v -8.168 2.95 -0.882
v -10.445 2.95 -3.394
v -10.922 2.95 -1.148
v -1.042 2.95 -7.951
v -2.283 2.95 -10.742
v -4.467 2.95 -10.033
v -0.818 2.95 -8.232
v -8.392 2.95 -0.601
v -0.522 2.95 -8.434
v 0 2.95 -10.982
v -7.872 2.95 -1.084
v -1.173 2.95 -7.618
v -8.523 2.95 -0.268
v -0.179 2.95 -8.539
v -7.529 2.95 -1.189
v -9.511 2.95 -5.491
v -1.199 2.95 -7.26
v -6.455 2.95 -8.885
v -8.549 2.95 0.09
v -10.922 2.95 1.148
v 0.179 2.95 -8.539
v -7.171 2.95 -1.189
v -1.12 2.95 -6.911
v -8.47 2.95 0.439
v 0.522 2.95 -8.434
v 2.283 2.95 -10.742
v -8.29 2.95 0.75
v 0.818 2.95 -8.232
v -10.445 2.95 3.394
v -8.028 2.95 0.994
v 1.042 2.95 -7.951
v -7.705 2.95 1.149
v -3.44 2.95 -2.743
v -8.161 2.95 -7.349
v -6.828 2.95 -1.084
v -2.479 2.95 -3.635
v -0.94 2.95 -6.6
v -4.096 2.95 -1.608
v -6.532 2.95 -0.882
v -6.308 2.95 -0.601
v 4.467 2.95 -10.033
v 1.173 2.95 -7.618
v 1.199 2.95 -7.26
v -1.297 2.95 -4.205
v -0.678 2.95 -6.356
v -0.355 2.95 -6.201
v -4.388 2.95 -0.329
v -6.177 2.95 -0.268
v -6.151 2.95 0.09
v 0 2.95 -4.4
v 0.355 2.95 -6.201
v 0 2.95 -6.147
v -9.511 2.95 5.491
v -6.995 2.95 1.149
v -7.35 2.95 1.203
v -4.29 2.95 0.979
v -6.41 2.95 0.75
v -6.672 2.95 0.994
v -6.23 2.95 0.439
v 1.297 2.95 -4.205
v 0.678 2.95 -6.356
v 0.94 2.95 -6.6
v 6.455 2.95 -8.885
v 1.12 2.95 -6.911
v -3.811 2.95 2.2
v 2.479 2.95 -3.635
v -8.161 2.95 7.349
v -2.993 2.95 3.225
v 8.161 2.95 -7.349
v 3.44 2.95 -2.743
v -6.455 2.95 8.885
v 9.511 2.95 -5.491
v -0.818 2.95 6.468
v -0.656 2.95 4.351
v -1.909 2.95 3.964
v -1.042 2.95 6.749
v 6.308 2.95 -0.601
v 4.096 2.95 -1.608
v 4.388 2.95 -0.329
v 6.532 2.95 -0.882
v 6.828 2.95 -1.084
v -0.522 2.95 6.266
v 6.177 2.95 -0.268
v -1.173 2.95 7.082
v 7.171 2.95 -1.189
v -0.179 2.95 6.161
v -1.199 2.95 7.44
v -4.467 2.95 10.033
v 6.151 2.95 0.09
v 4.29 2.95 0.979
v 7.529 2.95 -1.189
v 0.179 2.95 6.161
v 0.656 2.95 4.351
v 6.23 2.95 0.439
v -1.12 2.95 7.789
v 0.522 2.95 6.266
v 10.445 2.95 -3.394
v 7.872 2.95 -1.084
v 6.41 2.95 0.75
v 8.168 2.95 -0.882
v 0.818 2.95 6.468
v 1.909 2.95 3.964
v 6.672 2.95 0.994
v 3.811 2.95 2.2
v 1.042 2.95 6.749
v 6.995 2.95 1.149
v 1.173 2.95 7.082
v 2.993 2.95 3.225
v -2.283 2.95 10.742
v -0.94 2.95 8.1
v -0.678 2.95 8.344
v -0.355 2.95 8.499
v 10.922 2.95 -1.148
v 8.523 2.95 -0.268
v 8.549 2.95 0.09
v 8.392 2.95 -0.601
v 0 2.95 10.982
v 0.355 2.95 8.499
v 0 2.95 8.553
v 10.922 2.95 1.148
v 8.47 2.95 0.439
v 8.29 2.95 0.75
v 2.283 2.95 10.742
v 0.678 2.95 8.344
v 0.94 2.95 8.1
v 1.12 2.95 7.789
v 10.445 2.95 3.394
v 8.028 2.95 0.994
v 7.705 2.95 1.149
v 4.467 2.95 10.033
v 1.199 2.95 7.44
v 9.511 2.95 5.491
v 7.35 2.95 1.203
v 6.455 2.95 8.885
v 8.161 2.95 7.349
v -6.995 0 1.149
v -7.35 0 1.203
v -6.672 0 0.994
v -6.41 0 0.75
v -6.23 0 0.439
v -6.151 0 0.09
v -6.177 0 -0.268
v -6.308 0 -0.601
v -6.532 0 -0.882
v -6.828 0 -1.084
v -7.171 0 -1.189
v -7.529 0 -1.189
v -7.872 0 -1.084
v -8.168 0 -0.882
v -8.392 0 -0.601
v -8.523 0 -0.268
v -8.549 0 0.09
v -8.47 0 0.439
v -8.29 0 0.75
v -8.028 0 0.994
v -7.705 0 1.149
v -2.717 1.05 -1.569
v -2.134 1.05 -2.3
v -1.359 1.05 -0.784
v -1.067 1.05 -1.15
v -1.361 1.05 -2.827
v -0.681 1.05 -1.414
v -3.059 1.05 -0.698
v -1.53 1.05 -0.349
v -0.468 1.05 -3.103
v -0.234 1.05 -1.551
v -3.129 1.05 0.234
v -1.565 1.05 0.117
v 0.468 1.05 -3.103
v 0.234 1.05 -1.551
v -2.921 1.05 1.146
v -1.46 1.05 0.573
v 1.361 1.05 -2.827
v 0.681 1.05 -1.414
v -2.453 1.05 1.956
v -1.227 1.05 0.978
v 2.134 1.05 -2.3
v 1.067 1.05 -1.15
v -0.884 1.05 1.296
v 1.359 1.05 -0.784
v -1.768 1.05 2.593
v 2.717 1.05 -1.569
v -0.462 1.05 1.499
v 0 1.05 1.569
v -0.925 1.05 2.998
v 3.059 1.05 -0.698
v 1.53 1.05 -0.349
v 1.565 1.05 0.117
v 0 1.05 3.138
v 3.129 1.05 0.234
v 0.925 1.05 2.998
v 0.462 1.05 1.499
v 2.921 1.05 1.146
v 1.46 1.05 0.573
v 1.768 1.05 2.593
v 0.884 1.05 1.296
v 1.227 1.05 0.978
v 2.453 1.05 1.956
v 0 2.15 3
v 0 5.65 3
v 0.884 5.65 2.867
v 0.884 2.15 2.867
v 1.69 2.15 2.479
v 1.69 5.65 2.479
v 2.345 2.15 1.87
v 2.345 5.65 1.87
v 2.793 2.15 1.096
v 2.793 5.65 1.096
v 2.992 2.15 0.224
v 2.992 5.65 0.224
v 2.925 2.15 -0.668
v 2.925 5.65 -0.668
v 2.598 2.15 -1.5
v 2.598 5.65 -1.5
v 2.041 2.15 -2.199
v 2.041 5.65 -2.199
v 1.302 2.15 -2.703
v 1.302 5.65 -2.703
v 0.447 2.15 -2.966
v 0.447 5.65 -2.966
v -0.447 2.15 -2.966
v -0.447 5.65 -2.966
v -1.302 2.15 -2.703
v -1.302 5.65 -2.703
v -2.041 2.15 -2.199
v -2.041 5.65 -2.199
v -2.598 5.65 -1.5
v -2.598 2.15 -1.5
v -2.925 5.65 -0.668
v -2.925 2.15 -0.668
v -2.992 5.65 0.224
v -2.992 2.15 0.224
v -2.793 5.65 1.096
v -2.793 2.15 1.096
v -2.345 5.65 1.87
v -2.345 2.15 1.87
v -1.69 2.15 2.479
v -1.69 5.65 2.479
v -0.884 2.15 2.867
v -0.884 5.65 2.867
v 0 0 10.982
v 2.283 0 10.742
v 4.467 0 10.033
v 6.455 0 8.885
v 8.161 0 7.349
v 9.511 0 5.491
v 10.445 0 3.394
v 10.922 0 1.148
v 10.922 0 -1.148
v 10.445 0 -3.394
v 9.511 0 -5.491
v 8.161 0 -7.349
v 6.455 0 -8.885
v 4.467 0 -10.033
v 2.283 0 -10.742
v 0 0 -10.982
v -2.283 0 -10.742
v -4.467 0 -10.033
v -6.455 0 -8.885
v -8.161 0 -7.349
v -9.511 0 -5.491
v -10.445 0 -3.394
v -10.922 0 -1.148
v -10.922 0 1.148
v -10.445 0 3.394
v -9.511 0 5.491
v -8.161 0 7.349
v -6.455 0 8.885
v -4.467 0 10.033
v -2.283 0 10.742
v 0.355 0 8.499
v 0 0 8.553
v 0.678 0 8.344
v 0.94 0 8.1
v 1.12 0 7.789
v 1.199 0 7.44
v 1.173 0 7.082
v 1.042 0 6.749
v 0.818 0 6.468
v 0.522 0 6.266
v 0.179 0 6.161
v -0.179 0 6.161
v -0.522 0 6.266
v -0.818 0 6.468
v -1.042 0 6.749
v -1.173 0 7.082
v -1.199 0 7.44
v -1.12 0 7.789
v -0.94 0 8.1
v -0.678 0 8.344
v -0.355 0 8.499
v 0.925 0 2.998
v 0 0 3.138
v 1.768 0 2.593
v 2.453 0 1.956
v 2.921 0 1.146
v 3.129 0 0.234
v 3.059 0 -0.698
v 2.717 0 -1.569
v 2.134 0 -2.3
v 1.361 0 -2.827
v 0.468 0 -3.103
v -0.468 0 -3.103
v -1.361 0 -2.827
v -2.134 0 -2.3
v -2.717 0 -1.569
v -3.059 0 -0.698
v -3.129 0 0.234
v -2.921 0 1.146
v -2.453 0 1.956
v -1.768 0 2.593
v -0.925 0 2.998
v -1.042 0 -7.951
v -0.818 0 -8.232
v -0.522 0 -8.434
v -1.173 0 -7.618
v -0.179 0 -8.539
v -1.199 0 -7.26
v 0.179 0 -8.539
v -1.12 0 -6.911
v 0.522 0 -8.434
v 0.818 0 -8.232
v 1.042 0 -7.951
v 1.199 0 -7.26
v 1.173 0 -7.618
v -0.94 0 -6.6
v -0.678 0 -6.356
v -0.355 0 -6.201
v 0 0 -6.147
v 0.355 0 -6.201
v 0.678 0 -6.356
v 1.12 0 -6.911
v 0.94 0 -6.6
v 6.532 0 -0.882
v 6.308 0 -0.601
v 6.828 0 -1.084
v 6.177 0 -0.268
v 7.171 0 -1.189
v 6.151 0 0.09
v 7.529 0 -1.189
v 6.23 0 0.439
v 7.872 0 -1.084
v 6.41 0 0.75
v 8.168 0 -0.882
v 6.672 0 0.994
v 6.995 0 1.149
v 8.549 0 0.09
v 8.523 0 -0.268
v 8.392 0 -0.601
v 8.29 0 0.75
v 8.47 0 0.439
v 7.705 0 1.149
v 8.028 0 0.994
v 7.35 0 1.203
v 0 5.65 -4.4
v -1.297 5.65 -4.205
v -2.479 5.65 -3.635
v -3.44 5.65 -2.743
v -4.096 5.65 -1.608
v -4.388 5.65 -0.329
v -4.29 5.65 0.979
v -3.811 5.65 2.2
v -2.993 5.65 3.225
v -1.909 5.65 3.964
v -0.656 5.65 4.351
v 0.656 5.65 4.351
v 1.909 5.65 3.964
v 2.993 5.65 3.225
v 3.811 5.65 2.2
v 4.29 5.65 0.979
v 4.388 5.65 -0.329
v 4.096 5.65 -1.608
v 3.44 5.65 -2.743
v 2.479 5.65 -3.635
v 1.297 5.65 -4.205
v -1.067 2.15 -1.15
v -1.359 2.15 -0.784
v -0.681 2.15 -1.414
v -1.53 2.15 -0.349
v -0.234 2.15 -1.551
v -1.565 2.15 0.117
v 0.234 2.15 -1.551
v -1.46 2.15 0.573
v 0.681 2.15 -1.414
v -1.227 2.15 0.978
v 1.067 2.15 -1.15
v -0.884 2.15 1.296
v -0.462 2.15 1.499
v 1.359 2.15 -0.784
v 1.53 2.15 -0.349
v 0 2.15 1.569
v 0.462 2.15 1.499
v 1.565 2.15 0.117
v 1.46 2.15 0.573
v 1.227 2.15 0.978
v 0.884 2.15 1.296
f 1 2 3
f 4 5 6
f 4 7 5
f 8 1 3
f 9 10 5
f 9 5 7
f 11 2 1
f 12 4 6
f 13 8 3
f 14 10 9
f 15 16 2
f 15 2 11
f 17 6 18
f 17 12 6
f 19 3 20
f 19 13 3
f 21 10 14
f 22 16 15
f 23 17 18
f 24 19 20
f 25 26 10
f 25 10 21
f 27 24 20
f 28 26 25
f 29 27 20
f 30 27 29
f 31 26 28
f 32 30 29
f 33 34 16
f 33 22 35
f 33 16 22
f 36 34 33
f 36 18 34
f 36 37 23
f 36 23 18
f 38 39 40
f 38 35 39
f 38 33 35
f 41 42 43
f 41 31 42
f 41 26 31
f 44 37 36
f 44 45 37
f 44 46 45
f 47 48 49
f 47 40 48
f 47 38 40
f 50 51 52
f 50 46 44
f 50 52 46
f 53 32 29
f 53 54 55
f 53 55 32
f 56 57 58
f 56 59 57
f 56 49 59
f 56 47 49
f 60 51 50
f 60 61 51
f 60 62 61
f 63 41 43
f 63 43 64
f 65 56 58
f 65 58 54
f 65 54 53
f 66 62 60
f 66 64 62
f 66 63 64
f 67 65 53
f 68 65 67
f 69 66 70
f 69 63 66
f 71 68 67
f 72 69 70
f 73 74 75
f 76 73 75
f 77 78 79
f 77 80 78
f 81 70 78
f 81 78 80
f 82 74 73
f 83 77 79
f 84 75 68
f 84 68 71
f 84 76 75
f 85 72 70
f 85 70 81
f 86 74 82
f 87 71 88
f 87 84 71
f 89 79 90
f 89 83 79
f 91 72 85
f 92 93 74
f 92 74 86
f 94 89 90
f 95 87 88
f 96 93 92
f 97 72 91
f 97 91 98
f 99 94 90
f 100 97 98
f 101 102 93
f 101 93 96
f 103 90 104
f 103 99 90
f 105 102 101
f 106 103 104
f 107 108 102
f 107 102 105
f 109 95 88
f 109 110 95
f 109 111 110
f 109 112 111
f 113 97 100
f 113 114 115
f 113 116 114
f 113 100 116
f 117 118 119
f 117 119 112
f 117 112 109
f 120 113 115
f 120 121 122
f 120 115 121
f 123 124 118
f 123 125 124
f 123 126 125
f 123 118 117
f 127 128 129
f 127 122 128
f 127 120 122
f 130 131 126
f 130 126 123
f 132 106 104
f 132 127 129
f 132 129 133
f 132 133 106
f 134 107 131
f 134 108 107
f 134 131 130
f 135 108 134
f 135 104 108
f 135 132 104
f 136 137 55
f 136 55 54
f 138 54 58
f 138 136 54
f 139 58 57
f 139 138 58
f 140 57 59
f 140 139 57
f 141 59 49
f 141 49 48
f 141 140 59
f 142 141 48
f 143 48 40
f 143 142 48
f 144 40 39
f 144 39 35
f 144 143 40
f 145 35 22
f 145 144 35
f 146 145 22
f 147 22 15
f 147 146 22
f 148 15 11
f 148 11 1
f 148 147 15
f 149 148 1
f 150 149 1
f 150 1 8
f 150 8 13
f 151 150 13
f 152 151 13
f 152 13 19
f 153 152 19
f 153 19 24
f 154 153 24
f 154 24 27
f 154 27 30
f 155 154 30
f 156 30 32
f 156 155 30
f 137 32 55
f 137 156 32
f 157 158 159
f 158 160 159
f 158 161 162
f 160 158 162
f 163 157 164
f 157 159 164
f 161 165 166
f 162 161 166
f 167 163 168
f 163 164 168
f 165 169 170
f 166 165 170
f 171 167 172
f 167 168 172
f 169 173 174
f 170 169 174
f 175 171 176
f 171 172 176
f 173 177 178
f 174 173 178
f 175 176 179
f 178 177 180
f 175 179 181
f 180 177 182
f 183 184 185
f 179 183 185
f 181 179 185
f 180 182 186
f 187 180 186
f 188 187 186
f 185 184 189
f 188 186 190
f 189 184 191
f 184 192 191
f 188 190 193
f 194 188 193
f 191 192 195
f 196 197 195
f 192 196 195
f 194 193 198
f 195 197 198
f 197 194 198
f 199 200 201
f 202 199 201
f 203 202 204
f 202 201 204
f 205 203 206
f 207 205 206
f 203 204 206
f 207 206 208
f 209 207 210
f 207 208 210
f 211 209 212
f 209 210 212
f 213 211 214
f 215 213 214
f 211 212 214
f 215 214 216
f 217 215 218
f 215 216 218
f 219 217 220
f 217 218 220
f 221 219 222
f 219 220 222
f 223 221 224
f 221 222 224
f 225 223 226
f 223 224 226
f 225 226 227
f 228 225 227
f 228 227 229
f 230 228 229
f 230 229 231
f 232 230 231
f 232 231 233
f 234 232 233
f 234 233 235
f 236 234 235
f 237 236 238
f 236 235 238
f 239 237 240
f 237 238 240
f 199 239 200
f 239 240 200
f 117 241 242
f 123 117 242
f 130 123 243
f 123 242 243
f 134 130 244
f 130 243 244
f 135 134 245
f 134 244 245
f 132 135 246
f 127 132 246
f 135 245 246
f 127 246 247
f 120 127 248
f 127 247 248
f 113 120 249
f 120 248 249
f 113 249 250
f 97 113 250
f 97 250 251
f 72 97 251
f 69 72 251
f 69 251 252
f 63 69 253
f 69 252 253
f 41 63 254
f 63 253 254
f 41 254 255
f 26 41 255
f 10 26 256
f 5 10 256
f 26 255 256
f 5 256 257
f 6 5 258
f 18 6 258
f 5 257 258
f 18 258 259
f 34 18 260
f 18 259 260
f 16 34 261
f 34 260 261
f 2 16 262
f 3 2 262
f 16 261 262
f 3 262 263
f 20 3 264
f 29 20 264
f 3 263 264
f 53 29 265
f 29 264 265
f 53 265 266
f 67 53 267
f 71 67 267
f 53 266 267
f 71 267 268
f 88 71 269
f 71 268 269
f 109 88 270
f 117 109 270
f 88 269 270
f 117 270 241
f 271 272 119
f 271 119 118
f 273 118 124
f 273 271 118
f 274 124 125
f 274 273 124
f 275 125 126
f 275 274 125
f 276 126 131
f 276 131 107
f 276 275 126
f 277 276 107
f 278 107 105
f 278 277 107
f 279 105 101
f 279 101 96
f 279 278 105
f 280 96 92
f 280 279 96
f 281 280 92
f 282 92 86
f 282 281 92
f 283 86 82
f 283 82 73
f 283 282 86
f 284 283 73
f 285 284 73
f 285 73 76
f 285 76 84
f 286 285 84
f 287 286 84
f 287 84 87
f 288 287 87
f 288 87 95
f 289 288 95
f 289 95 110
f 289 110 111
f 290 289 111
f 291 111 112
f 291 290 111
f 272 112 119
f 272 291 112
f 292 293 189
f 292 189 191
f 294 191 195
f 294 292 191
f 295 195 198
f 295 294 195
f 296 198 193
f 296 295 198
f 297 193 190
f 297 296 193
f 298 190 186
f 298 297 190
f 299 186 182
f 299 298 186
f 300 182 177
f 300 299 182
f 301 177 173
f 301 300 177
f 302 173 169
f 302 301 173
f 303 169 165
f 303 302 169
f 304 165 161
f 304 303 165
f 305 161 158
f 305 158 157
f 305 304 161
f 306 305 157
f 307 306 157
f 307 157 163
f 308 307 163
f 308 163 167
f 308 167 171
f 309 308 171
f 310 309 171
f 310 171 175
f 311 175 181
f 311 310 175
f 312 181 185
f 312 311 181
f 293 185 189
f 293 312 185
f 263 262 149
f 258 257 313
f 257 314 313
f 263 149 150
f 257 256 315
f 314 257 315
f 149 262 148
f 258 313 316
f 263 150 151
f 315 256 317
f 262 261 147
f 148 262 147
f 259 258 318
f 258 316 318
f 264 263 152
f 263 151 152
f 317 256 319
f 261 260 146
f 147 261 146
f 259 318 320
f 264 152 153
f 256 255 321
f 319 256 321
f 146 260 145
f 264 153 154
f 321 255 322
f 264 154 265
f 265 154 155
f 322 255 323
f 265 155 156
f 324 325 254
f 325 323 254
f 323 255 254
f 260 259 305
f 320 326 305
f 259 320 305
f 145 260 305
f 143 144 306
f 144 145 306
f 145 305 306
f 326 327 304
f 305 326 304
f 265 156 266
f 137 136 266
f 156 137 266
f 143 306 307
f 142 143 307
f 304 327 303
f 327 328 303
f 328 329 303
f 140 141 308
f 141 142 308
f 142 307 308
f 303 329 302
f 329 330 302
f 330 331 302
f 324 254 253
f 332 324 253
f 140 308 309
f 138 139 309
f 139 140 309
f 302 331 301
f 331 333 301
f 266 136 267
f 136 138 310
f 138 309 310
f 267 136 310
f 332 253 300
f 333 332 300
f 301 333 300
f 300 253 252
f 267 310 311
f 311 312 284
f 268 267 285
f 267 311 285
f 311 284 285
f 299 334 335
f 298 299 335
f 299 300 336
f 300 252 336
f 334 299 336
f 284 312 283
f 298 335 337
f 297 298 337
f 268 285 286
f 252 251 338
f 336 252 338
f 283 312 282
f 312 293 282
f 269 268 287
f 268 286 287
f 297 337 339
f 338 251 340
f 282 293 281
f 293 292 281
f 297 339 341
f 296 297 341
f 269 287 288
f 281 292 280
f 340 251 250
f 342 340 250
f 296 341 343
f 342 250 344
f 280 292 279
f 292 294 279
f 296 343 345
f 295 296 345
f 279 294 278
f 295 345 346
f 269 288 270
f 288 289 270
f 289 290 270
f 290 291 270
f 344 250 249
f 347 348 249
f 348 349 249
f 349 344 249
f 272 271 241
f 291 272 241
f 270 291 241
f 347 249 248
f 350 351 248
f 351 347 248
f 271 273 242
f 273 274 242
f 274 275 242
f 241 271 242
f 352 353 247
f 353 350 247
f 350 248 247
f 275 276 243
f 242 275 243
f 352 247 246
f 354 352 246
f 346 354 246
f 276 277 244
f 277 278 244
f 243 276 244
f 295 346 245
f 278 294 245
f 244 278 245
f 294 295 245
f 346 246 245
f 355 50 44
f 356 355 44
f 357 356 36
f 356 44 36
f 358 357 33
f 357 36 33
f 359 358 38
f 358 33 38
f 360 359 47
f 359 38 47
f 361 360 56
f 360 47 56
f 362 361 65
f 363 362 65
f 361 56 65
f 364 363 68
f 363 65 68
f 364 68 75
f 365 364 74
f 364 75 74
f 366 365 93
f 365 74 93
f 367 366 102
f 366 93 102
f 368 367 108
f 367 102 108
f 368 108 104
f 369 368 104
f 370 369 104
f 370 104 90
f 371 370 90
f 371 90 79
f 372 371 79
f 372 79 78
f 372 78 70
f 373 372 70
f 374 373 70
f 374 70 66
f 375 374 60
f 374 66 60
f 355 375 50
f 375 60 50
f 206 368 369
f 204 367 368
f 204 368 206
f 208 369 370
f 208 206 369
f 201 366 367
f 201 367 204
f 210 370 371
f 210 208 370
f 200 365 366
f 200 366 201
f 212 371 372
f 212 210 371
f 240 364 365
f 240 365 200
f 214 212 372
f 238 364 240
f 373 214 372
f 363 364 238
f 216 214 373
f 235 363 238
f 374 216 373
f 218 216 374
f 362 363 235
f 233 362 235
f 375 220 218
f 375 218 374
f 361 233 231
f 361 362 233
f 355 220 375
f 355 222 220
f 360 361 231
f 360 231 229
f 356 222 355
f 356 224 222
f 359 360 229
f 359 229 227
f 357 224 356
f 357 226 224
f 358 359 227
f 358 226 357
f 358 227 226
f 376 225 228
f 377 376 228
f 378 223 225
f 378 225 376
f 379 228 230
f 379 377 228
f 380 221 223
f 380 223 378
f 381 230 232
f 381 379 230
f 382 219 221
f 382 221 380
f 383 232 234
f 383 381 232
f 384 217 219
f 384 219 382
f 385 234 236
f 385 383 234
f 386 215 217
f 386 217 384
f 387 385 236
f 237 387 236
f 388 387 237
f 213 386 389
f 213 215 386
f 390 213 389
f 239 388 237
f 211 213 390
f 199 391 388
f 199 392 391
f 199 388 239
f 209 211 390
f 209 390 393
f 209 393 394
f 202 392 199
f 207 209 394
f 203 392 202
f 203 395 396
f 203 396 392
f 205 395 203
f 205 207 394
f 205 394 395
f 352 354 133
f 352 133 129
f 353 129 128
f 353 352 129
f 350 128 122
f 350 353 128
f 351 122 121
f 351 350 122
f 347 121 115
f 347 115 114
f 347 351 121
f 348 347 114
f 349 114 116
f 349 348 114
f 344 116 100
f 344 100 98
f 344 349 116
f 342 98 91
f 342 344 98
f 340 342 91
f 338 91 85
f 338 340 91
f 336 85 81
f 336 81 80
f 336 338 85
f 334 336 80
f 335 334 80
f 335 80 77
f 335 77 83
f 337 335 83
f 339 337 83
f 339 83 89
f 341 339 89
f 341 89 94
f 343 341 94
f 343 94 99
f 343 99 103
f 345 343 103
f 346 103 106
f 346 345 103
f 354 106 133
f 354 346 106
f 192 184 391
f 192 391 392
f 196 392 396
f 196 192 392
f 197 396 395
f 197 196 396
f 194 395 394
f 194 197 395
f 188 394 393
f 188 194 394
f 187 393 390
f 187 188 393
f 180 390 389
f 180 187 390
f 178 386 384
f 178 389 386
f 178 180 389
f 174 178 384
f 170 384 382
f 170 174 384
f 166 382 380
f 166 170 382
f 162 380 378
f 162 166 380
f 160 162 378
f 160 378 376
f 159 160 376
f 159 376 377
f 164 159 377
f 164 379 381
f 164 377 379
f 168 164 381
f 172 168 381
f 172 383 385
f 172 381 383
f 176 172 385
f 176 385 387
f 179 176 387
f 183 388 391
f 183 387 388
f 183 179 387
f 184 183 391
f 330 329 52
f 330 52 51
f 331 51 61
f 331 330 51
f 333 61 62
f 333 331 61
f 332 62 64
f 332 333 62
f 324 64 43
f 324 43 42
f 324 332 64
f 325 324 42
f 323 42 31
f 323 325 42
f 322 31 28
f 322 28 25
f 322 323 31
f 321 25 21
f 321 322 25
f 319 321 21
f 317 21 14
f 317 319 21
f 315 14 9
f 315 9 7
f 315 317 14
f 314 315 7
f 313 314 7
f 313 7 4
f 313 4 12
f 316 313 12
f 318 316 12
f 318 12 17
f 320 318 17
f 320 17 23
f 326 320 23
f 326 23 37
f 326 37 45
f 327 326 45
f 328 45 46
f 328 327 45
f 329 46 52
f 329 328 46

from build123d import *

# Parameters (mm, degrees)
CROQUIS_BASE_R          = 10.982321859
SALIENTE_EXTRUIR1_DEPTH = 2.95
CROQUIS_BASE_3_R        = 1.568903123
CROQUIS_BASE_3_R_2      = 1.202825727
CORTAR_EXTRUIR1_DEPTH   = 2.95
CROQUIS_BASE_4_R        = 3.137806245
CORTAR_EXTRUIR2_DEPTH   = 1.05
CROQUIS2_R              = 4.4
SALIENTE_EXTRUIR2_DEPTH = 2.7
CROQUIS3_R              = 3
CORTAR_EXTRUIR3_DEPTH   = 3.5


with BuildPart() as part:
    # Croquis base → Saliente-Extruir1 (new body)
    with BuildSketch(Plane(origin=(0, 0, 0), x_dir=(1, 0, 0), z_dir=(0, 1, 0))):
        Circle(CROQUIS_BASE_R)
    extrude(amount=SALIENTE_EXTRUIR1_DEPTH)

    # Croquis base<3> → Cortar-Extruir1 (cut)
    with BuildSketch(Plane(origin=(0, 0, 0), x_dir=(1, 0, 0), z_dir=(0, 1, 0))):
        Circle(CROQUIS_BASE_3_R)
        with Locations((-7.35, 0)):
            Circle(CROQUIS_BASE_3_R_2)
        with Locations((0, 7.35)):
            Circle(CROQUIS_BASE_3_R_2)
        with Locations((7.35, 0)):
            Circle(CROQUIS_BASE_3_R_2)
        with Locations((0, -7.35)):
            Circle(CROQUIS_BASE_3_R_2)
    extrude(amount=CORTAR_EXTRUIR1_DEPTH, mode=Mode.SUBTRACT)

    # Croquis base<4> → Cortar-Extruir2 (cut)
    with BuildSketch(Plane(origin=(0, 0, 0), x_dir=(1, 0, 0), z_dir=(0, 1, 0))):
        Circle(CROQUIS_BASE_4_R)
    extrude(amount=CORTAR_EXTRUIR2_DEPTH, mode=Mode.SUBTRACT)

    # Croquis2 → Saliente-Extruir2 (add)
    with BuildSketch(Plane(origin=(0, 2.95, 0), x_dir=(1, 0, 0), z_dir=(0, 1, 0))):
        Circle(CROQUIS2_R)
    extrude(amount=SALIENTE_EXTRUIR2_DEPTH)

    # Croquis3 → Cortar-Extruir3 (cut)
    with BuildSketch(Plane(origin=(0, 5.65, 0), x_dir=(1, 0, 0), z_dir=(0, 1, 0))):
        Circle(CROQUIS3_R)
    extrude(amount=-CORTAR_EXTRUIR3_DEPTH, mode=Mode.SUBTRACT)


solid = part.part
